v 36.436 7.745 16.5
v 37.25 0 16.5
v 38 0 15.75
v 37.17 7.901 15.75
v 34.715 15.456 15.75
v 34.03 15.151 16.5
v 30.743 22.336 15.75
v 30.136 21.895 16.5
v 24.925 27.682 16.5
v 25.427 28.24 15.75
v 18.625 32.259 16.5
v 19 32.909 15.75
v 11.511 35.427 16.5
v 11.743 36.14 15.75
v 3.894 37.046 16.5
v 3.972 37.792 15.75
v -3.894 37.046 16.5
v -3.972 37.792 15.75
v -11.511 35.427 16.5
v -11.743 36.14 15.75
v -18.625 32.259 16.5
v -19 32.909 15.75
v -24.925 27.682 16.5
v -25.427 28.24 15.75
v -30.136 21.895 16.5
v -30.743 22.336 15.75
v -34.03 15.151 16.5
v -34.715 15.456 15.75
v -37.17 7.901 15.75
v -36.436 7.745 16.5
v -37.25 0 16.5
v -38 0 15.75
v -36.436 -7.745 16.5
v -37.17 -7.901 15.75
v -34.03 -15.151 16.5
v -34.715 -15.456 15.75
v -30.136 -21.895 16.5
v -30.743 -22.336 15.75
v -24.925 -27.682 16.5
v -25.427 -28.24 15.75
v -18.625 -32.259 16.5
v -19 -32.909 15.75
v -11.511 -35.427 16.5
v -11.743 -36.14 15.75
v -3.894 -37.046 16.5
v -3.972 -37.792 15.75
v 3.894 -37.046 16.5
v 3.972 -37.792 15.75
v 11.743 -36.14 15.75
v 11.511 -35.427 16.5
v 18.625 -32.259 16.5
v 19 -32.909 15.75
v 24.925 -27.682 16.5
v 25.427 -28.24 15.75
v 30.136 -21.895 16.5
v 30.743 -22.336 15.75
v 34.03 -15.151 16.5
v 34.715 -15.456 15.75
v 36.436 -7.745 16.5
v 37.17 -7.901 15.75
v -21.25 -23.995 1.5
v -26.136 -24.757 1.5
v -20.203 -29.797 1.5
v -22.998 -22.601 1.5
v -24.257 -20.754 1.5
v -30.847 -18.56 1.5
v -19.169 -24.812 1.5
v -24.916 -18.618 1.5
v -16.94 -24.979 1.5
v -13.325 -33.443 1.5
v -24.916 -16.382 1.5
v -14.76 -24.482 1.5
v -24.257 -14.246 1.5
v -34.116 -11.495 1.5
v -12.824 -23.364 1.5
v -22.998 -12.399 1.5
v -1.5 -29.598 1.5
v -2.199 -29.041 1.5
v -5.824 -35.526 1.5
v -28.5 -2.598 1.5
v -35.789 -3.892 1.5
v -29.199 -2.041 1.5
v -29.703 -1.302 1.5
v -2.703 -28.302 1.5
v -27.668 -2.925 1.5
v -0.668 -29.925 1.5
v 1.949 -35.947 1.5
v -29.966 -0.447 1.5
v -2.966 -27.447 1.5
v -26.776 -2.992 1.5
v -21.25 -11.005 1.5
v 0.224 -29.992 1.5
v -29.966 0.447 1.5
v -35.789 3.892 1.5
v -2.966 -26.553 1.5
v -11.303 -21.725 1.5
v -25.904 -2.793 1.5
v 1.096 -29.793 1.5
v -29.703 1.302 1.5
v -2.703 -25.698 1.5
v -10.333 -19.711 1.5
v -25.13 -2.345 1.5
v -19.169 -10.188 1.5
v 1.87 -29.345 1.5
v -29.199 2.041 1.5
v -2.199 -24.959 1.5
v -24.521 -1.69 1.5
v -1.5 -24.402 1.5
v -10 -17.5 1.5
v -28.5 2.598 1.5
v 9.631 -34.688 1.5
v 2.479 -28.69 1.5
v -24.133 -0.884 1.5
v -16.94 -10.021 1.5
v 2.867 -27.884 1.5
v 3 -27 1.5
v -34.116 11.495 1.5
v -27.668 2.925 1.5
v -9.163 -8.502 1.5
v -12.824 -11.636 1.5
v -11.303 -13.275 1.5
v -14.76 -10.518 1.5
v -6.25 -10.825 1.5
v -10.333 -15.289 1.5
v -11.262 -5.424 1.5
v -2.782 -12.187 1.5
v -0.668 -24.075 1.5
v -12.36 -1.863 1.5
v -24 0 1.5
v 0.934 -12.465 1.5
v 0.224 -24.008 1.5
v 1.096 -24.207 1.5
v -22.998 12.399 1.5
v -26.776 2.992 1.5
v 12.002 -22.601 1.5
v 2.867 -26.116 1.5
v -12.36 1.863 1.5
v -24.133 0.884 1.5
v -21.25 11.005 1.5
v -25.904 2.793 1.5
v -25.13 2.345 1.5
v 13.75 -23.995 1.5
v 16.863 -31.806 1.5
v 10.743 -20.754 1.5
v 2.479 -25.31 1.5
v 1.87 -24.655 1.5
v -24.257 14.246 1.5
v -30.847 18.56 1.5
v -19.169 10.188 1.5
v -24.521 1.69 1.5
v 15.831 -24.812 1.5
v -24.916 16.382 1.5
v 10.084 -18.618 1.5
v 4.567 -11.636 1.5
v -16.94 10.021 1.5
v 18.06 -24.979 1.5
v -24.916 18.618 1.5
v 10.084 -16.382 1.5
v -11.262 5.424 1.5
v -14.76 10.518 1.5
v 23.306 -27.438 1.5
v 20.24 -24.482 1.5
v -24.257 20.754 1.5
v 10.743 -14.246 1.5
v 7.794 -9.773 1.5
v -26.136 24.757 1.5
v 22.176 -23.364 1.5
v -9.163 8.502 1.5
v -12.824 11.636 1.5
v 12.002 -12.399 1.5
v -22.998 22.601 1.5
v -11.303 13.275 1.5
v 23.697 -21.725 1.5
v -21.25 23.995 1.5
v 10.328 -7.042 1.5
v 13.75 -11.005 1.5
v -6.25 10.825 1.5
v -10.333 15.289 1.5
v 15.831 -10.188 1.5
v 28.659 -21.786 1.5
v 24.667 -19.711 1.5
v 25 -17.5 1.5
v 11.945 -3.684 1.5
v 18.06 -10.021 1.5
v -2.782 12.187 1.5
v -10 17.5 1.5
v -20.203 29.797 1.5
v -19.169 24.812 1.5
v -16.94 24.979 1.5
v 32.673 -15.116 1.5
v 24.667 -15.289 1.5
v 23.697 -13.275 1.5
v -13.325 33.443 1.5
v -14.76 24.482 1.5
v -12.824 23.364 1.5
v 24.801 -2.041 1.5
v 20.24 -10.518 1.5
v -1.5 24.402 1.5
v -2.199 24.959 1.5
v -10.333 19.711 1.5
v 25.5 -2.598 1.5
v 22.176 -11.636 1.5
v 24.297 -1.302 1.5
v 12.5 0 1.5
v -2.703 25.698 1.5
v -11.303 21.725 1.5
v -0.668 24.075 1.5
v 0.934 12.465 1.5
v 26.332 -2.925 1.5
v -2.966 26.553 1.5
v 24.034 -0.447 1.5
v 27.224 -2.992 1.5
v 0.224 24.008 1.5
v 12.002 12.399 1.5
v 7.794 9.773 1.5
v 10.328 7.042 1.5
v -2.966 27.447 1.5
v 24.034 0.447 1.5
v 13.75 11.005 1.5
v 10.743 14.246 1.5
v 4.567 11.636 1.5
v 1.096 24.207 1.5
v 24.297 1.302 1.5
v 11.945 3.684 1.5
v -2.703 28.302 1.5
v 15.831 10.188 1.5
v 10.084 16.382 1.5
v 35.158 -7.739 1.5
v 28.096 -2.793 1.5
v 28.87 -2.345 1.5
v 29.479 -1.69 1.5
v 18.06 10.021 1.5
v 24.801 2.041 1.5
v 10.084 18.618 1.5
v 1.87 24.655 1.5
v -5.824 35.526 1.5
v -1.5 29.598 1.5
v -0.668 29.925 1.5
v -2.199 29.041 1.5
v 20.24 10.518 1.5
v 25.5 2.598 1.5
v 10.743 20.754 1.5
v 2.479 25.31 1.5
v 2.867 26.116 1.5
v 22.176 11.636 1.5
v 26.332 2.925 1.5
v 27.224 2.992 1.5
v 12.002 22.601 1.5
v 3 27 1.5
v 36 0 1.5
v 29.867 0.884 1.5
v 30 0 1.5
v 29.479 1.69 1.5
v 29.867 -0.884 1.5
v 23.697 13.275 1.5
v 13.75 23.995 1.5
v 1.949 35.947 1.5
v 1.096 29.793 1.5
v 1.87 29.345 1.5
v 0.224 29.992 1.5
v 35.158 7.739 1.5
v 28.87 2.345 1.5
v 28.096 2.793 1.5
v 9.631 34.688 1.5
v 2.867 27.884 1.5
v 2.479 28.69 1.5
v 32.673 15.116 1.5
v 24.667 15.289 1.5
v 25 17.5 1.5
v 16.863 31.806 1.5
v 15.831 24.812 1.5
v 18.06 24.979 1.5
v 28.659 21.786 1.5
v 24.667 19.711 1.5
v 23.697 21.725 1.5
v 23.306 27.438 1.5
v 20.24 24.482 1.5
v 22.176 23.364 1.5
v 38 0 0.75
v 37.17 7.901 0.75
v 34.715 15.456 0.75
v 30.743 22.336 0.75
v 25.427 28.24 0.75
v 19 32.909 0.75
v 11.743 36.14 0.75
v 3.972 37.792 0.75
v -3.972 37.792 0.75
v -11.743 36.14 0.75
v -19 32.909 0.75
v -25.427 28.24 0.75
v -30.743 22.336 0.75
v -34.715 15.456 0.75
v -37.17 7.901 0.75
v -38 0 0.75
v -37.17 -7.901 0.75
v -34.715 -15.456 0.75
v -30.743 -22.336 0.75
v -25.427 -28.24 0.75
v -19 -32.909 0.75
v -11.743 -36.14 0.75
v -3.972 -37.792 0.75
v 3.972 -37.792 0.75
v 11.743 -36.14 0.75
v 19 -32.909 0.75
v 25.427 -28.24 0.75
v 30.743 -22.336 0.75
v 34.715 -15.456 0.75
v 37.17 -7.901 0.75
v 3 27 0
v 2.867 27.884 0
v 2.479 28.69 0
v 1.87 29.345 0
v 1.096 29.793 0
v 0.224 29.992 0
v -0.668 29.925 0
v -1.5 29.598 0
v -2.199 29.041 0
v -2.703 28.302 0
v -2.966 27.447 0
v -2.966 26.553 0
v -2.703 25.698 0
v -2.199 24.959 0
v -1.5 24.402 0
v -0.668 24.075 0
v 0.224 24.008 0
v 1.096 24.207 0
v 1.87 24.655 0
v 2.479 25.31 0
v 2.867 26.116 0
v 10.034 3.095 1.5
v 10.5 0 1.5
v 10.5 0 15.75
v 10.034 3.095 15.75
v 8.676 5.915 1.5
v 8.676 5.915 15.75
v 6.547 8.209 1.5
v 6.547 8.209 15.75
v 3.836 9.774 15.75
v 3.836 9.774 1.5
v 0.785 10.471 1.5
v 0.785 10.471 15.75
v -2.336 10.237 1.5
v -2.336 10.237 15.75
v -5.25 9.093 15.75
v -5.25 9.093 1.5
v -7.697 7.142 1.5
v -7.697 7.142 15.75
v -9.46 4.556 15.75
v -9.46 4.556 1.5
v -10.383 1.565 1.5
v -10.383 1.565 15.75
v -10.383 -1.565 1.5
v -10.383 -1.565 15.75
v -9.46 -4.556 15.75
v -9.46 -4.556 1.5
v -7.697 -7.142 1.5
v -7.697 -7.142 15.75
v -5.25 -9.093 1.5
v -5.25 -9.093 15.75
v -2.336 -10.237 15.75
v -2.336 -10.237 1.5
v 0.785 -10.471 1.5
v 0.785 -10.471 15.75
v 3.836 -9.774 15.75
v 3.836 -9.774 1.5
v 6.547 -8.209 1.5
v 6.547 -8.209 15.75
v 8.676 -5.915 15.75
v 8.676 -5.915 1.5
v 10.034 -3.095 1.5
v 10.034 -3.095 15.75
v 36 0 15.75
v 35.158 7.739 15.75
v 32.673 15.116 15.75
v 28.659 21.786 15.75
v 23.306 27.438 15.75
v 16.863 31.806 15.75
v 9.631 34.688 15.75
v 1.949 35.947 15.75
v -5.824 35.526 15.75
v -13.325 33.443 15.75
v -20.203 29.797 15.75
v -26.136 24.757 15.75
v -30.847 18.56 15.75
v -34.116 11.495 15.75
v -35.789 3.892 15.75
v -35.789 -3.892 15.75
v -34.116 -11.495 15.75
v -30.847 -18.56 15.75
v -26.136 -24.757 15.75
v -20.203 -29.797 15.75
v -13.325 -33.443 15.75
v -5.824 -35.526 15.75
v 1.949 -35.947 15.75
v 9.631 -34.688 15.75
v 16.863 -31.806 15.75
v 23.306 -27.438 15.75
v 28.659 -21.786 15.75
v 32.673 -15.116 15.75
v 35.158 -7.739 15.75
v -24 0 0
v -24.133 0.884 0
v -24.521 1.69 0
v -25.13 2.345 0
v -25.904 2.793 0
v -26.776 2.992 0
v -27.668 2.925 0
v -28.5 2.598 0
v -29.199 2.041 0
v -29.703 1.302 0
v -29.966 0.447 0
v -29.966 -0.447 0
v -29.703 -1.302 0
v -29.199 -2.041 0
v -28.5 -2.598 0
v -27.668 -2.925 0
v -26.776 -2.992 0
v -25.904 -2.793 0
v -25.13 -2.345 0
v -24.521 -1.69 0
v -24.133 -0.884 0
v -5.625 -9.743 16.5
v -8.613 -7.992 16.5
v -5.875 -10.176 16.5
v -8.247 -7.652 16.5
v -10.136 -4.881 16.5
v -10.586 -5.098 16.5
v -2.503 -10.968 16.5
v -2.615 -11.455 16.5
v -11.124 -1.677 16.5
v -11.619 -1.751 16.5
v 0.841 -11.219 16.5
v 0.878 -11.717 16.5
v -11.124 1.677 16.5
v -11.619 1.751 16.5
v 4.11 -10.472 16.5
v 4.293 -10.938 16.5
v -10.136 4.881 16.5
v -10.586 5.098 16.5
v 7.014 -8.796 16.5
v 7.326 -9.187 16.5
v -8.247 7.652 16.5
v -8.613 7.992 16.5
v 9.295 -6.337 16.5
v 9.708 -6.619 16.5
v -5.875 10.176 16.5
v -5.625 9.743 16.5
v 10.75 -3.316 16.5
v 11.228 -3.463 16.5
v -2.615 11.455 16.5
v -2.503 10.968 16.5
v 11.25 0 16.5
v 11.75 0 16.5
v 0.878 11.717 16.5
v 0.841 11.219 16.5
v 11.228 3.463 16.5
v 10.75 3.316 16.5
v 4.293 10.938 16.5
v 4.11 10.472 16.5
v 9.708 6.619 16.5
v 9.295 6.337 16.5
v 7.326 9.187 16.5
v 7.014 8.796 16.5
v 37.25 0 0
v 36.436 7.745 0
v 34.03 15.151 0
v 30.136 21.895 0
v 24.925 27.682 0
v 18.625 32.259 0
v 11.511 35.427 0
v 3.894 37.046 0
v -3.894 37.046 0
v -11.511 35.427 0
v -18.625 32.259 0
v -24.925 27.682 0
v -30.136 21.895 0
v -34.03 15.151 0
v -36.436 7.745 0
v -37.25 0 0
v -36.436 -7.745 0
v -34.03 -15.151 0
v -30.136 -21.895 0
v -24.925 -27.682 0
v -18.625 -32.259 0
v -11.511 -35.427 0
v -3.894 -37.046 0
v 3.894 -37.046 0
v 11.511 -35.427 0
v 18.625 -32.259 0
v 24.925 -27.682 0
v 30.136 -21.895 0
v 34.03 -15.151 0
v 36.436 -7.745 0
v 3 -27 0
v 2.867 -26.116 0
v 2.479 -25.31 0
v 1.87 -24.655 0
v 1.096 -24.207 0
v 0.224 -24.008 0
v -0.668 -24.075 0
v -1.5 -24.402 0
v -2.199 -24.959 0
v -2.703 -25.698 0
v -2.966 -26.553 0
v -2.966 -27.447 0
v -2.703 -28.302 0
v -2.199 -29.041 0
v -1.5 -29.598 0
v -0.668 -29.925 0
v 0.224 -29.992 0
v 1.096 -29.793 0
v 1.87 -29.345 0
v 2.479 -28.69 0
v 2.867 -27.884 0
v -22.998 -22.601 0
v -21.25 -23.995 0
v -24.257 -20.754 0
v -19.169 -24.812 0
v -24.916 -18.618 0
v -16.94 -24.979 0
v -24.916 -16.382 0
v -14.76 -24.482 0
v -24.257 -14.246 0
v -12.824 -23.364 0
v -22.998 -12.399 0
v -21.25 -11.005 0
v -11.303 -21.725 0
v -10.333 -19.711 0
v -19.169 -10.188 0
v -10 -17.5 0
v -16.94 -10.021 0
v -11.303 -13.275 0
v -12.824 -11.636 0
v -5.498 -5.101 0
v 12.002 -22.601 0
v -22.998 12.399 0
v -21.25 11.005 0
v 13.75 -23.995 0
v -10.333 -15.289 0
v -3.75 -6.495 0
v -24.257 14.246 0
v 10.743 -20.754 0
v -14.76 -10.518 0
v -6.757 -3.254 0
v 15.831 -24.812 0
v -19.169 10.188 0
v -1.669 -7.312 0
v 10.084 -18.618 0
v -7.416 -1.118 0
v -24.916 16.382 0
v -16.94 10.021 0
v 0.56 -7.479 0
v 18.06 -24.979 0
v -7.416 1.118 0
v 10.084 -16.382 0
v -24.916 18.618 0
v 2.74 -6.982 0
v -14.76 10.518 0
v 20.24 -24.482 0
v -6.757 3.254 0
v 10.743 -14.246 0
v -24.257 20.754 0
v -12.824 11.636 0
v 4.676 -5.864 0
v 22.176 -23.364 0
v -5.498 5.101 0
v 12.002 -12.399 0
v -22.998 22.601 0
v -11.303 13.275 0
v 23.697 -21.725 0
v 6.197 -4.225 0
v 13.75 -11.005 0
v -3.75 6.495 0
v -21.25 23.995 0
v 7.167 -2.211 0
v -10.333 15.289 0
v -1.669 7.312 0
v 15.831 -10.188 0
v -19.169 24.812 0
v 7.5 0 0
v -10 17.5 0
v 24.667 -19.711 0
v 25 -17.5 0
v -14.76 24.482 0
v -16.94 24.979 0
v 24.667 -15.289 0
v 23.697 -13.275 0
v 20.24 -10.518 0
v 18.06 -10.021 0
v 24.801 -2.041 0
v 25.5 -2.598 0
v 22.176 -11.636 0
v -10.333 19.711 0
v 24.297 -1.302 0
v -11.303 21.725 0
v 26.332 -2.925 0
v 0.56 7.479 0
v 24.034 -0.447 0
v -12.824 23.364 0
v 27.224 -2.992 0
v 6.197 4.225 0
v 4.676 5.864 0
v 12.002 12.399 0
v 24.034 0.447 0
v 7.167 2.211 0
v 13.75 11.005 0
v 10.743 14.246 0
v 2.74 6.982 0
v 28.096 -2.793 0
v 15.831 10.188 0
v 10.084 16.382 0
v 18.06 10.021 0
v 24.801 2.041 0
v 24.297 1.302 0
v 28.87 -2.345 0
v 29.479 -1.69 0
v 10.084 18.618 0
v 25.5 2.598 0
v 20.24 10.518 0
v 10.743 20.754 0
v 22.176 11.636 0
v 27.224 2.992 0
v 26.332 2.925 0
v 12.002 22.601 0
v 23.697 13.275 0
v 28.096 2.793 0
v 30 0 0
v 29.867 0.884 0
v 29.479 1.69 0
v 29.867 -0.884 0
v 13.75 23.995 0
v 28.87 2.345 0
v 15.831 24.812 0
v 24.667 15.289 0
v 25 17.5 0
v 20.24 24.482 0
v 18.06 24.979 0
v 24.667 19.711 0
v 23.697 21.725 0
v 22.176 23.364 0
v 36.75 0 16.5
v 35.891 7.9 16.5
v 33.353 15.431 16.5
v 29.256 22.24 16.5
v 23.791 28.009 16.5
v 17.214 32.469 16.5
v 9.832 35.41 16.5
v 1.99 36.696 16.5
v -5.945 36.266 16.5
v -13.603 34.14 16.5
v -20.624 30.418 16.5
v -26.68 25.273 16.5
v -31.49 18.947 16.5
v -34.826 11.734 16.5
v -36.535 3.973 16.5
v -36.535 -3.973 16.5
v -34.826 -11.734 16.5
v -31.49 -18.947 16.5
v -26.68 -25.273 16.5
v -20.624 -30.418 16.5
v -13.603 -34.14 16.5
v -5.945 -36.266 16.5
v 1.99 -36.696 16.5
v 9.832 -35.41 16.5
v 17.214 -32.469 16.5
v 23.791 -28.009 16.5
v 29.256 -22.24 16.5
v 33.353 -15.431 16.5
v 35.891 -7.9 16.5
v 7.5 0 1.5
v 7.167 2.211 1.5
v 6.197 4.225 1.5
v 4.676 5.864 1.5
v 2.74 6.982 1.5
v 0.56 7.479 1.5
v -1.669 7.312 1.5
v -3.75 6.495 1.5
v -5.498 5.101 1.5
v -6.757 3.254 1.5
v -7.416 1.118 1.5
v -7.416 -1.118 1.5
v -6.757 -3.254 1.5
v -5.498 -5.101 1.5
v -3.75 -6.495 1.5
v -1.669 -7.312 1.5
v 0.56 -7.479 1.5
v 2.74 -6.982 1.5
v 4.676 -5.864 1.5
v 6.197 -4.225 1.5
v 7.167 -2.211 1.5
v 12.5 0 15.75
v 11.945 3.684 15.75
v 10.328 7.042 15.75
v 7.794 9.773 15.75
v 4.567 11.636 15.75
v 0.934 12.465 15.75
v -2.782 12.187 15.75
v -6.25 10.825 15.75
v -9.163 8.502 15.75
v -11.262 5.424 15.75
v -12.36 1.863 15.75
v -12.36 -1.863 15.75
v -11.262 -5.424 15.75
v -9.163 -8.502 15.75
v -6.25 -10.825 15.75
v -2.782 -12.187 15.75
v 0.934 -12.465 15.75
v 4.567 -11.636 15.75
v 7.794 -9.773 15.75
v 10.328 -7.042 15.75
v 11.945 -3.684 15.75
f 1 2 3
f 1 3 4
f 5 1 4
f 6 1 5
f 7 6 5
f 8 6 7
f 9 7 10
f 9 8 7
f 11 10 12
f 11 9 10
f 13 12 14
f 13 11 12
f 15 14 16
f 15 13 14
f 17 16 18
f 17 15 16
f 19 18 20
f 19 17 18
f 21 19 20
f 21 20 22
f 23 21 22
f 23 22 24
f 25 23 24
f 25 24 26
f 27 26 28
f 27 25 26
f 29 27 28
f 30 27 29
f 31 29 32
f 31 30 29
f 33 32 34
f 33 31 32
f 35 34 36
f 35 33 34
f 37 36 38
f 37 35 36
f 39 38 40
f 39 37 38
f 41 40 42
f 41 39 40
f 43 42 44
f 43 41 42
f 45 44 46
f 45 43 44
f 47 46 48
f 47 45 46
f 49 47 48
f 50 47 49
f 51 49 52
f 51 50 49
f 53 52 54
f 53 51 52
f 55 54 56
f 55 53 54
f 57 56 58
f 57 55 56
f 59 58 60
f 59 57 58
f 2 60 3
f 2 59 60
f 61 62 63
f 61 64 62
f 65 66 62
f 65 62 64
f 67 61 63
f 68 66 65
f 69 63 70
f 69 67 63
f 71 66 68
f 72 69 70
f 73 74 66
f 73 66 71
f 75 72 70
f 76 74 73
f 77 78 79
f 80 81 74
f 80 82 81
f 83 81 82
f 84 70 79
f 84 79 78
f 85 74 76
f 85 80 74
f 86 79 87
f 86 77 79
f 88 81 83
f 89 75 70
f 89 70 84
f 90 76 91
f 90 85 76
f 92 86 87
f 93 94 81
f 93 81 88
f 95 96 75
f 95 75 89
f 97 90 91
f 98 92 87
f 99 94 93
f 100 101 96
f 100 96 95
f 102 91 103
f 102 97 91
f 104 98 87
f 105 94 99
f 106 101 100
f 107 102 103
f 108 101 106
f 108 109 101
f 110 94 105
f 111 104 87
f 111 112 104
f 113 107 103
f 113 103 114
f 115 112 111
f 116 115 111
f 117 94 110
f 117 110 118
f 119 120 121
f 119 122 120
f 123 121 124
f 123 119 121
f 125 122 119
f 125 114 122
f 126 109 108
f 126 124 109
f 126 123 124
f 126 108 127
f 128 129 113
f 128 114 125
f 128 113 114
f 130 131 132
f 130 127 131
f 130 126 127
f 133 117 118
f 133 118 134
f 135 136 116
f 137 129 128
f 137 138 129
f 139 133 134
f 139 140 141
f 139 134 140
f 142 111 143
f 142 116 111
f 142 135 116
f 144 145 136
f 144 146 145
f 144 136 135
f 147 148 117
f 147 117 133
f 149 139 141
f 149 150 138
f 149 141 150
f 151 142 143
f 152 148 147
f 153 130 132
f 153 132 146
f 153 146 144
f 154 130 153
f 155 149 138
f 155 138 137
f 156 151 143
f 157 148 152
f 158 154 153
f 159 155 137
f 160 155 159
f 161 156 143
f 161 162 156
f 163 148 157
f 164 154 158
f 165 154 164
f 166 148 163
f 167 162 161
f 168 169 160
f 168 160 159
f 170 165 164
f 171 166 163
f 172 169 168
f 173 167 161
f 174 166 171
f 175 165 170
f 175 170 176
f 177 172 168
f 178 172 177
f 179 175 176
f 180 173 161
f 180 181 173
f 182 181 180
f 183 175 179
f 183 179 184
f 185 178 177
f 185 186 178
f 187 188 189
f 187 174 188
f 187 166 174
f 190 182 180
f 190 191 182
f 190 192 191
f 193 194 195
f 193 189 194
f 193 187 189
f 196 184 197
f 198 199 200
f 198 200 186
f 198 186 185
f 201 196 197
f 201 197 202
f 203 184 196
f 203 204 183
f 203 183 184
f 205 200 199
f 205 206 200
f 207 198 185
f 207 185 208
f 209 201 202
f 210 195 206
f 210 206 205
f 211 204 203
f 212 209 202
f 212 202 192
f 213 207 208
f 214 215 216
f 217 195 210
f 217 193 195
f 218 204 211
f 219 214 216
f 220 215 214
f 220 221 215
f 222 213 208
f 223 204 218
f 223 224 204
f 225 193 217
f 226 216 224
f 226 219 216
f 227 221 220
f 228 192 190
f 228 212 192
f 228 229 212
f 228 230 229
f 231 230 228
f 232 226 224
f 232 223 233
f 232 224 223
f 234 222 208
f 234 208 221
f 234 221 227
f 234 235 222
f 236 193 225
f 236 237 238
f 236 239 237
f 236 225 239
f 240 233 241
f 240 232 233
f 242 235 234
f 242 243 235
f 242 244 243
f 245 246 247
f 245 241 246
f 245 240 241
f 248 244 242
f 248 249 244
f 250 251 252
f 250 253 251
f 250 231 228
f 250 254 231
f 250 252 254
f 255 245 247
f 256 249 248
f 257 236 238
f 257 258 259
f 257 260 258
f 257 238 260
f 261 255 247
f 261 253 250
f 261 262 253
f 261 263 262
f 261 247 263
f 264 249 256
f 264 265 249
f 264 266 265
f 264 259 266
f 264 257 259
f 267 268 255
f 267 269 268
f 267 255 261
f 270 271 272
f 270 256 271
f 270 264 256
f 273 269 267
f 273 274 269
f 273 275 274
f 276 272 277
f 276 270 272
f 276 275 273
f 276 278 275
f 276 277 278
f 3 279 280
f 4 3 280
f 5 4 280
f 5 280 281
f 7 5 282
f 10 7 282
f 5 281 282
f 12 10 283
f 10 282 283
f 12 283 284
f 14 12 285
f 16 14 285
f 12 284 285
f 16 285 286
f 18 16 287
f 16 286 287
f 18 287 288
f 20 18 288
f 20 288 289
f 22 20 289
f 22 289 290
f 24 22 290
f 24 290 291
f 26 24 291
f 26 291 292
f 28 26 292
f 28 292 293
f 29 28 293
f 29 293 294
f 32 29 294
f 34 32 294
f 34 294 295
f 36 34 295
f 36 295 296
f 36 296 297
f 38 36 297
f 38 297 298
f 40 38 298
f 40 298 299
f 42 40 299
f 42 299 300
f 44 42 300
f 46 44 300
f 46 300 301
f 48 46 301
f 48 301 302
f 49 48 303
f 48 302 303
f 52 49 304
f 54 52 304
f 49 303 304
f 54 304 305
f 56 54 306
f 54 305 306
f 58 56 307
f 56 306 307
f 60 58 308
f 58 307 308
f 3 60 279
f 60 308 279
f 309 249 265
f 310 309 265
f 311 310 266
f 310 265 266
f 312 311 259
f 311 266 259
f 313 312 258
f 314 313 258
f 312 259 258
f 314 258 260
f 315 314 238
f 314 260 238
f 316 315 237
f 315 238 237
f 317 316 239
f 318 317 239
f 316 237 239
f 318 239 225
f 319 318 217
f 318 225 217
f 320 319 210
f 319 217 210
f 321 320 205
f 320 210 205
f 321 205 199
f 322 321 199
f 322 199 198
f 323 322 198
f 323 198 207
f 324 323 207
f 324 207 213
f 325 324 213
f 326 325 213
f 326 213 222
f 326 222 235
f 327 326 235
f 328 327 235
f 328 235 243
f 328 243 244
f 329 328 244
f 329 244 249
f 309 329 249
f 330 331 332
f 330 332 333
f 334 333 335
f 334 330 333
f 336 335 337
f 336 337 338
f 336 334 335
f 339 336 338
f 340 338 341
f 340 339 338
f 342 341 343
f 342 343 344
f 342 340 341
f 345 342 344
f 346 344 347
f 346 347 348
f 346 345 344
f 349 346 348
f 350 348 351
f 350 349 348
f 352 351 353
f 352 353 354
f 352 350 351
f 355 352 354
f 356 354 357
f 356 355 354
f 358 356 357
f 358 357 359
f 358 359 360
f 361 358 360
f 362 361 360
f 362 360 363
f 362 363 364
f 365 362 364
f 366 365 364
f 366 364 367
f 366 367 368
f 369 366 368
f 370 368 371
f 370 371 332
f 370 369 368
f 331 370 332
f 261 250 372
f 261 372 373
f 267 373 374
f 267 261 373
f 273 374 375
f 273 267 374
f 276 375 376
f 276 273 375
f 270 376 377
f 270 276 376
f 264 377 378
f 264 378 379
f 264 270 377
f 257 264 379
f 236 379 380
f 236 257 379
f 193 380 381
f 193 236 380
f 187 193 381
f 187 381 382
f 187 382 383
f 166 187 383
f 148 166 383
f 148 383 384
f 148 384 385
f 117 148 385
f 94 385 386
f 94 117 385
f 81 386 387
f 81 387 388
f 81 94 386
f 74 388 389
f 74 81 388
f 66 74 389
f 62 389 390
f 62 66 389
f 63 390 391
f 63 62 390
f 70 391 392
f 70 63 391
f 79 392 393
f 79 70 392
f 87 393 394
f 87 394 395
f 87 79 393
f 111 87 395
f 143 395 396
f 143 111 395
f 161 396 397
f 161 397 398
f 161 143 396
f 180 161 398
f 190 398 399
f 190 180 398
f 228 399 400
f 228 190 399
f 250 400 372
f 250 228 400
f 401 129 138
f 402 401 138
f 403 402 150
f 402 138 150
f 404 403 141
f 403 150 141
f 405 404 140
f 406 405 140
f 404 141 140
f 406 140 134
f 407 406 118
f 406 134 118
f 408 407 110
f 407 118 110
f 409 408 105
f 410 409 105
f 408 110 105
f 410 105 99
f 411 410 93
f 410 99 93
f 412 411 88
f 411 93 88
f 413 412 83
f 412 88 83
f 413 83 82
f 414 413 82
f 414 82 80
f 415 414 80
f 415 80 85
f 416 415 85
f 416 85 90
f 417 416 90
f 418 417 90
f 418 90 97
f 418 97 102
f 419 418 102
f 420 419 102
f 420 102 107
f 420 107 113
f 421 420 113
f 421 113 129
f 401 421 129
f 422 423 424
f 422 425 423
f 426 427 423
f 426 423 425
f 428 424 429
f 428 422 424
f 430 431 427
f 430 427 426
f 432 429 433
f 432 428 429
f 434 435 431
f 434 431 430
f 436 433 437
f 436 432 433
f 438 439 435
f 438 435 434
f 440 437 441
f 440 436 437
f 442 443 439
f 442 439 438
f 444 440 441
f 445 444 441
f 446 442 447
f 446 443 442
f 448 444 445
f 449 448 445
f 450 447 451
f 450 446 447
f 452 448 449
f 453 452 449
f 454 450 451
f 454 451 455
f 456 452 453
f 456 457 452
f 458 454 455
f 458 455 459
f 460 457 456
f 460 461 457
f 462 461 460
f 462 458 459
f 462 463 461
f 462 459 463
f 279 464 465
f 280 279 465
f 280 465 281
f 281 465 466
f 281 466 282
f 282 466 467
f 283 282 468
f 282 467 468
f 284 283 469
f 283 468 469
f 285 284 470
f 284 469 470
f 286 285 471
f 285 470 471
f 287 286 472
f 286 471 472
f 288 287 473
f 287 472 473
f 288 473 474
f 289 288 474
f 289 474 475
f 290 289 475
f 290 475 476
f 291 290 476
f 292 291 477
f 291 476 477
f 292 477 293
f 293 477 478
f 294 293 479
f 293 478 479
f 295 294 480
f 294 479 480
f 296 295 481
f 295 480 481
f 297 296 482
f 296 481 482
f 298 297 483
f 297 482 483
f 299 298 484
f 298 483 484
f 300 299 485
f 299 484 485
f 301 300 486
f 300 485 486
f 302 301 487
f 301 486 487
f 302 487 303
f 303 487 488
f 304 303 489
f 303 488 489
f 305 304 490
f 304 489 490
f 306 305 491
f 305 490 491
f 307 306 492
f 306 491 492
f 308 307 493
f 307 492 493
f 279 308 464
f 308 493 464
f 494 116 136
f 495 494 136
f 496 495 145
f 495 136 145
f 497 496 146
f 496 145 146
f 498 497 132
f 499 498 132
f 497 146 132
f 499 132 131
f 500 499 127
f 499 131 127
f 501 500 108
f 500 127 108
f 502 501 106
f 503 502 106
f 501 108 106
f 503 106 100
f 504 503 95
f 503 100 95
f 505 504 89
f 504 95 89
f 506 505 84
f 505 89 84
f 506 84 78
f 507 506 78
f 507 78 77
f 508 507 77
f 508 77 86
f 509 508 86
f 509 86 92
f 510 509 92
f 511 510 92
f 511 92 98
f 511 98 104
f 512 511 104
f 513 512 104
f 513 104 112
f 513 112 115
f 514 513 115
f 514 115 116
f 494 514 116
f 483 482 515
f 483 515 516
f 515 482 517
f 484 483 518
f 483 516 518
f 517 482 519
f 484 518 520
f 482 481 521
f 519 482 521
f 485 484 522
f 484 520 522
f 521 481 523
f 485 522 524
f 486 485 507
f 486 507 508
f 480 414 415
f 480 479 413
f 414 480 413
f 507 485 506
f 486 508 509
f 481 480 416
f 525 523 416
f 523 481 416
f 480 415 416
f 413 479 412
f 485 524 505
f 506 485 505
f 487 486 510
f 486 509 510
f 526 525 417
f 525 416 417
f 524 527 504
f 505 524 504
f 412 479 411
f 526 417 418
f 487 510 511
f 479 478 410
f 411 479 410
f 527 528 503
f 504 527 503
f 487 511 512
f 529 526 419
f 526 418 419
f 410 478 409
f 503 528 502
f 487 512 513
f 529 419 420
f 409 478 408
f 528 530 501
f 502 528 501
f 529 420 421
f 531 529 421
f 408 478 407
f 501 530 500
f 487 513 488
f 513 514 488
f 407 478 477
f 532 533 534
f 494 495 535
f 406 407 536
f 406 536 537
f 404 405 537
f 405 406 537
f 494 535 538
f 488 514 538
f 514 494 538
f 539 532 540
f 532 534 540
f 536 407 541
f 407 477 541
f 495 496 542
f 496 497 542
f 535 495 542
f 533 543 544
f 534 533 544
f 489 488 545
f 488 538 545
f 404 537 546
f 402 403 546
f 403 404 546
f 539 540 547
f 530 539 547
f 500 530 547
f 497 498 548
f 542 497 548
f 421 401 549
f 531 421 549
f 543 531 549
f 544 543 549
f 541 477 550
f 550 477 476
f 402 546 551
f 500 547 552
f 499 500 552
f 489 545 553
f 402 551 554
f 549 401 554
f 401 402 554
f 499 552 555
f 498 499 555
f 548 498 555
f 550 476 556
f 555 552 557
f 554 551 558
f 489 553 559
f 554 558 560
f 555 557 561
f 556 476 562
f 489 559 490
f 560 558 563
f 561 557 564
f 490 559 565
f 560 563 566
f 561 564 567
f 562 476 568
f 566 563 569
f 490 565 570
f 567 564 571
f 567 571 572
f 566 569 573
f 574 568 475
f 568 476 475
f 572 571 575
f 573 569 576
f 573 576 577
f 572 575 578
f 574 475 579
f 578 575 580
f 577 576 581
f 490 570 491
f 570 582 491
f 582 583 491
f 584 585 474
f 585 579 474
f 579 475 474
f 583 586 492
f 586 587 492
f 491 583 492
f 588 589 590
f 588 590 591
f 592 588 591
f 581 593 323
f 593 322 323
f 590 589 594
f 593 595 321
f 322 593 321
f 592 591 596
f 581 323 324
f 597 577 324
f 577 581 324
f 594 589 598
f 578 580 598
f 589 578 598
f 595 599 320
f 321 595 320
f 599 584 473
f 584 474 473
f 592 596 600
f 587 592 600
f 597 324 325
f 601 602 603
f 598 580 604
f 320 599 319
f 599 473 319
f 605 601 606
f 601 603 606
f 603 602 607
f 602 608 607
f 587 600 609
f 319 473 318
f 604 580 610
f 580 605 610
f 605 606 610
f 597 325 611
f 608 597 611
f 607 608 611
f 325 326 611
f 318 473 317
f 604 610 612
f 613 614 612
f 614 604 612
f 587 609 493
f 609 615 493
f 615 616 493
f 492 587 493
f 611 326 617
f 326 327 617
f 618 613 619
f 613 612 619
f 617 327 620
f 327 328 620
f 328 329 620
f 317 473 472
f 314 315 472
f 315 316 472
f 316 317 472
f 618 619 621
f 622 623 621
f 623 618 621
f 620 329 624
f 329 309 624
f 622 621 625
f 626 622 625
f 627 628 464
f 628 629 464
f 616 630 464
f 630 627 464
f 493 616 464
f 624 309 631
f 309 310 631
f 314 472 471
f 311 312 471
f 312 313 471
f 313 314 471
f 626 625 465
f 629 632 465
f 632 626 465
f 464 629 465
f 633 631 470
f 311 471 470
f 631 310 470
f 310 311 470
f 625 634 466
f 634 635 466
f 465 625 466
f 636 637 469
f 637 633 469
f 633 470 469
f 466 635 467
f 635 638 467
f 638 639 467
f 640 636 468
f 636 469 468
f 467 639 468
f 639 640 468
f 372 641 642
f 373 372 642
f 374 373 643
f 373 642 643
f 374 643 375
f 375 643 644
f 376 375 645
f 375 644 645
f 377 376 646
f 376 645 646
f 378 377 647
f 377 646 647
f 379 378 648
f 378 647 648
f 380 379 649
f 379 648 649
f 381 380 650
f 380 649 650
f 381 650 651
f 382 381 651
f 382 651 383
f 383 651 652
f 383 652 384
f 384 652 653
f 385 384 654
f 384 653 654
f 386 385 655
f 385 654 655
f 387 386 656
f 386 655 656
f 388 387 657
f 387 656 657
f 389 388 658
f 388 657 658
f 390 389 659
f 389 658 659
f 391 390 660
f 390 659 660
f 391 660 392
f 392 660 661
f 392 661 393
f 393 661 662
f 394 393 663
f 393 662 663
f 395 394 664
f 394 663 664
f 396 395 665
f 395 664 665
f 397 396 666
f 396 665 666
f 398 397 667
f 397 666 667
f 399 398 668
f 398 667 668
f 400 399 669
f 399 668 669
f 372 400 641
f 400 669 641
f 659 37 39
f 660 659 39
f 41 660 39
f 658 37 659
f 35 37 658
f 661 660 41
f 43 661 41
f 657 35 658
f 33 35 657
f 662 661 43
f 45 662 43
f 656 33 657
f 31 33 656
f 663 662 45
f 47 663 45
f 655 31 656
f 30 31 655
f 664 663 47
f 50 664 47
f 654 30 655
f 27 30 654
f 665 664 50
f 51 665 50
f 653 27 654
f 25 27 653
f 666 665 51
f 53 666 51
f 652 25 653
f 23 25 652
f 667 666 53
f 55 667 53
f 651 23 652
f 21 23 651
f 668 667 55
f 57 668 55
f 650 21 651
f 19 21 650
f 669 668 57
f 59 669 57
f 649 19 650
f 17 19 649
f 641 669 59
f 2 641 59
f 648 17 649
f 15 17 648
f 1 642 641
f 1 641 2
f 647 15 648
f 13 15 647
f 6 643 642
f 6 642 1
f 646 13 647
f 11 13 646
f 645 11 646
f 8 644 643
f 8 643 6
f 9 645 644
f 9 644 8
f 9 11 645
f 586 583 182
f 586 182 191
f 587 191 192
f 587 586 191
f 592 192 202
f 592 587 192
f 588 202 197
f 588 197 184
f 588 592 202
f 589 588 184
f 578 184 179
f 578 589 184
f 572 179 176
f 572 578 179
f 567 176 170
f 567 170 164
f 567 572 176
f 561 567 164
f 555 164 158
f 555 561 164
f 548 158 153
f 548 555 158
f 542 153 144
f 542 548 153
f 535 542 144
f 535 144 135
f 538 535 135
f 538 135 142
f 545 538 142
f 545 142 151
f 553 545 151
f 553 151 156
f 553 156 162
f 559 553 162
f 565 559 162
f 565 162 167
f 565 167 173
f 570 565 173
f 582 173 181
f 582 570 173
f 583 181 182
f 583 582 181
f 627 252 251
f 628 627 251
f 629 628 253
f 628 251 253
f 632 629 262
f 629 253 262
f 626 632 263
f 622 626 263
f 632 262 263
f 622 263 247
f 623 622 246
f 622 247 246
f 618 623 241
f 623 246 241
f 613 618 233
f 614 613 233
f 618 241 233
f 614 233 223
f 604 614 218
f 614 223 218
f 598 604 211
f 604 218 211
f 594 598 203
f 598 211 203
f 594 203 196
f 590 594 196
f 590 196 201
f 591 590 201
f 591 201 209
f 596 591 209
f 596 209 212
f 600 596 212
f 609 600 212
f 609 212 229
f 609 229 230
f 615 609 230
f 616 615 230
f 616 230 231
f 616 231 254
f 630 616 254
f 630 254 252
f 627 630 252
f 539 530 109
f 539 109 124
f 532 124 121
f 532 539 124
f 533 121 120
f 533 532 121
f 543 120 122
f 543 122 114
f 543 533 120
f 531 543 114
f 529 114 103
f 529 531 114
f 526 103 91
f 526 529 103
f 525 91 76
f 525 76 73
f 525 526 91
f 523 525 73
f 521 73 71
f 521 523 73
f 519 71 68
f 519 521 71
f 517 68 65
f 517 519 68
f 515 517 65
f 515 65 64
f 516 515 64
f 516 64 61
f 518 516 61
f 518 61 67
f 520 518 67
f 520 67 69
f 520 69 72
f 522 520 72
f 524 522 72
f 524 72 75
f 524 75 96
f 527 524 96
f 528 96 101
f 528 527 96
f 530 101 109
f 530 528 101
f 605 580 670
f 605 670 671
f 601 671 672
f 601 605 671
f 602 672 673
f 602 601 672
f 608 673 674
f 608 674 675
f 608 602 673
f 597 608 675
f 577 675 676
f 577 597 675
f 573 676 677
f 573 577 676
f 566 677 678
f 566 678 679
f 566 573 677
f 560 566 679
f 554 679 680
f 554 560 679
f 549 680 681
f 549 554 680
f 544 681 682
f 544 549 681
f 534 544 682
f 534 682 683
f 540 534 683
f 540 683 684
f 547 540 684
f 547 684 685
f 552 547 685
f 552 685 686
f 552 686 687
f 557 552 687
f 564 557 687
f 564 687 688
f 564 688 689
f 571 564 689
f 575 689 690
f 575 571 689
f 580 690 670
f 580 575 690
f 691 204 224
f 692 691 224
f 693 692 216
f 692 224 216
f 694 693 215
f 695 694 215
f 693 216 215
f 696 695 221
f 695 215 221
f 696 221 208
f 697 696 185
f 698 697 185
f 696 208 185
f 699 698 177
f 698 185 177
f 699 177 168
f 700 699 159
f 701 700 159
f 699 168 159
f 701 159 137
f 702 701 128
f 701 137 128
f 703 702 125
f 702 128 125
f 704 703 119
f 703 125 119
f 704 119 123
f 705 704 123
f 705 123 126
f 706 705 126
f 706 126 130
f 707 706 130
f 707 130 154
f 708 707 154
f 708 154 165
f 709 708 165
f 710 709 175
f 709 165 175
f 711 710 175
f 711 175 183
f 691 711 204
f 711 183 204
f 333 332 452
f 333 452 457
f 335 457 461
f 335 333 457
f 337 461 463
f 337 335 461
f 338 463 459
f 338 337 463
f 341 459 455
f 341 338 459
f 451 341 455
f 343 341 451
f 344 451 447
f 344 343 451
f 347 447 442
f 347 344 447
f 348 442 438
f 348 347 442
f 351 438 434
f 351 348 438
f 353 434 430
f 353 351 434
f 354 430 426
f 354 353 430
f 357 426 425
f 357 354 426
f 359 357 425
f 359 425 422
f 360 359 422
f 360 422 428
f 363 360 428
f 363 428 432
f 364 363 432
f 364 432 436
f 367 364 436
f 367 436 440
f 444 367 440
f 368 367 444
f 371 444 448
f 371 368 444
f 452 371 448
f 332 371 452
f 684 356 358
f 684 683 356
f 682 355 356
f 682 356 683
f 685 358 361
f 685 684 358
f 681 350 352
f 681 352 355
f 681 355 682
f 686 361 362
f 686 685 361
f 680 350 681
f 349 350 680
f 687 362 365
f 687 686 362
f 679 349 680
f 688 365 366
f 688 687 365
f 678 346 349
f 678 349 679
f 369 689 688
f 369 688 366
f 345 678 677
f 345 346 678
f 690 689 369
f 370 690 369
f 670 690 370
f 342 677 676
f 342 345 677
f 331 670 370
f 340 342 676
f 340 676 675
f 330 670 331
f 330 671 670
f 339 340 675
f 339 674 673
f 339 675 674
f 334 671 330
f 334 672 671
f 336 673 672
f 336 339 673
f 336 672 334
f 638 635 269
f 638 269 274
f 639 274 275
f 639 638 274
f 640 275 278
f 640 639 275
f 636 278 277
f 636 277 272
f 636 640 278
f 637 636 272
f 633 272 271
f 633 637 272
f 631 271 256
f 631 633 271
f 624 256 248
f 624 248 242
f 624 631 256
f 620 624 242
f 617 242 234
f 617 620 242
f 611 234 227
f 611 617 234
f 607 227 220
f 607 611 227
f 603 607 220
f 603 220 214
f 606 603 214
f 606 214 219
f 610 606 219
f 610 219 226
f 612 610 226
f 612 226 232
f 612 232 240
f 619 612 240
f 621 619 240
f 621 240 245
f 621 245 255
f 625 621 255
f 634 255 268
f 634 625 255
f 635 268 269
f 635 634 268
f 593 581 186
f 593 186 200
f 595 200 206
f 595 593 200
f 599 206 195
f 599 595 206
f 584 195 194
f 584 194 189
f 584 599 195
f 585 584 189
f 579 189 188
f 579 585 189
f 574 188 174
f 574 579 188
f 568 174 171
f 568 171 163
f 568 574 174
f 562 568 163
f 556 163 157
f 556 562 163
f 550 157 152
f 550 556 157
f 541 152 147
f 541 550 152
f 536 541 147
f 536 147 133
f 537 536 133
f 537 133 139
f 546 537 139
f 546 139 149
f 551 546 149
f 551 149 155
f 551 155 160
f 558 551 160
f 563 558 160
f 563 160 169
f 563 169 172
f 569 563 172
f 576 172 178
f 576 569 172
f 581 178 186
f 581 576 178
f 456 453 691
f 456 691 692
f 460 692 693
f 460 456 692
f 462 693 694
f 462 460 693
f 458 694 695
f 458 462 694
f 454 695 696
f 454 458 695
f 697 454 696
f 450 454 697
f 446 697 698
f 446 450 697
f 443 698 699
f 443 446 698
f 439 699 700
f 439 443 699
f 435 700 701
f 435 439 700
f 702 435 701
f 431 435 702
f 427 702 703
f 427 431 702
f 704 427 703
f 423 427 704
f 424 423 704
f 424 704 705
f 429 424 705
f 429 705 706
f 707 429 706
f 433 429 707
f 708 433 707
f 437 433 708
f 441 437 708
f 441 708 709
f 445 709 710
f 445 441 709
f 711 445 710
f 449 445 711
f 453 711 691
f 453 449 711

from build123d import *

# Parameters (mm, degrees)
F0_R     = 38
F0_R_2   = 7.5
F1_DEPTH = 1.5
F2_R     = 38
F2_R_2   = 36
F2_R_3   = 12.5
F2_R_4   = 10.5
F3_DEPTH = 15
F4_SIZE  = 0.75
F5_R     = 3
F6_DEPTH = 1.501


with BuildPart() as f1:
    # F0 (on Top) → F1 (new body)
    with BuildSketch(Plane.XY):
        Circle(F0_R)
        with Locations((-17.5, -17.5)):
            Circle(F0_R_2, mode=Mode.SUBTRACT)
        with Locations((17.5, -17.5)):
            Circle(F0_R_2, mode=Mode.SUBTRACT)
        with Locations((-17.5, 17.5)):
            Circle(F0_R_2, mode=Mode.SUBTRACT)
        Circle(F0_R_2, mode=Mode.SUBTRACT)
        with Locations((17.5, 17.5)):
            Circle(F0_R_2, mode=Mode.SUBTRACT)
    extrude(amount=F1_DEPTH)

    # F2 (on face) → F3 (join)
    with BuildSketch(Plane.XY.offset(1.5)):
        Circle(F2_R)
        Circle(F2_R_2, mode=Mode.SUBTRACT)
        Circle(F2_R_3)
        Circle(F2_R_4, mode=Mode.SUBTRACT)
    extrude(amount=F3_DEPTH)

    # F4
    f4_edges = [f1.edges().sort_by_distance(p)[0] for p in [
        (-38, 0, 0),
        (-38, 0, 16.5),
        (-36, 0, 16.5),
        (-12.5, 0, 16.5),
        (-10.5, 0, 16.5),
    ]]
    chamfer(f4_edges, length=F4_SIZE)

    # F5 (on face) → F6 (cut, through all)
    with BuildSketch(Plane.XY.offset(1.5)):
        with Locations((-27, 0)):
            Circle(F5_R)
        with Locations((0, -27)):
            Circle(F5_R)
        with Locations((27, 0)):
            Circle(F5_R)
        with Locations((0, 27)):
            Circle(F5_R)
    extrude(amount=-F6_DEPTH, mode=Mode.SUBTRACT)


solid = f1.part
